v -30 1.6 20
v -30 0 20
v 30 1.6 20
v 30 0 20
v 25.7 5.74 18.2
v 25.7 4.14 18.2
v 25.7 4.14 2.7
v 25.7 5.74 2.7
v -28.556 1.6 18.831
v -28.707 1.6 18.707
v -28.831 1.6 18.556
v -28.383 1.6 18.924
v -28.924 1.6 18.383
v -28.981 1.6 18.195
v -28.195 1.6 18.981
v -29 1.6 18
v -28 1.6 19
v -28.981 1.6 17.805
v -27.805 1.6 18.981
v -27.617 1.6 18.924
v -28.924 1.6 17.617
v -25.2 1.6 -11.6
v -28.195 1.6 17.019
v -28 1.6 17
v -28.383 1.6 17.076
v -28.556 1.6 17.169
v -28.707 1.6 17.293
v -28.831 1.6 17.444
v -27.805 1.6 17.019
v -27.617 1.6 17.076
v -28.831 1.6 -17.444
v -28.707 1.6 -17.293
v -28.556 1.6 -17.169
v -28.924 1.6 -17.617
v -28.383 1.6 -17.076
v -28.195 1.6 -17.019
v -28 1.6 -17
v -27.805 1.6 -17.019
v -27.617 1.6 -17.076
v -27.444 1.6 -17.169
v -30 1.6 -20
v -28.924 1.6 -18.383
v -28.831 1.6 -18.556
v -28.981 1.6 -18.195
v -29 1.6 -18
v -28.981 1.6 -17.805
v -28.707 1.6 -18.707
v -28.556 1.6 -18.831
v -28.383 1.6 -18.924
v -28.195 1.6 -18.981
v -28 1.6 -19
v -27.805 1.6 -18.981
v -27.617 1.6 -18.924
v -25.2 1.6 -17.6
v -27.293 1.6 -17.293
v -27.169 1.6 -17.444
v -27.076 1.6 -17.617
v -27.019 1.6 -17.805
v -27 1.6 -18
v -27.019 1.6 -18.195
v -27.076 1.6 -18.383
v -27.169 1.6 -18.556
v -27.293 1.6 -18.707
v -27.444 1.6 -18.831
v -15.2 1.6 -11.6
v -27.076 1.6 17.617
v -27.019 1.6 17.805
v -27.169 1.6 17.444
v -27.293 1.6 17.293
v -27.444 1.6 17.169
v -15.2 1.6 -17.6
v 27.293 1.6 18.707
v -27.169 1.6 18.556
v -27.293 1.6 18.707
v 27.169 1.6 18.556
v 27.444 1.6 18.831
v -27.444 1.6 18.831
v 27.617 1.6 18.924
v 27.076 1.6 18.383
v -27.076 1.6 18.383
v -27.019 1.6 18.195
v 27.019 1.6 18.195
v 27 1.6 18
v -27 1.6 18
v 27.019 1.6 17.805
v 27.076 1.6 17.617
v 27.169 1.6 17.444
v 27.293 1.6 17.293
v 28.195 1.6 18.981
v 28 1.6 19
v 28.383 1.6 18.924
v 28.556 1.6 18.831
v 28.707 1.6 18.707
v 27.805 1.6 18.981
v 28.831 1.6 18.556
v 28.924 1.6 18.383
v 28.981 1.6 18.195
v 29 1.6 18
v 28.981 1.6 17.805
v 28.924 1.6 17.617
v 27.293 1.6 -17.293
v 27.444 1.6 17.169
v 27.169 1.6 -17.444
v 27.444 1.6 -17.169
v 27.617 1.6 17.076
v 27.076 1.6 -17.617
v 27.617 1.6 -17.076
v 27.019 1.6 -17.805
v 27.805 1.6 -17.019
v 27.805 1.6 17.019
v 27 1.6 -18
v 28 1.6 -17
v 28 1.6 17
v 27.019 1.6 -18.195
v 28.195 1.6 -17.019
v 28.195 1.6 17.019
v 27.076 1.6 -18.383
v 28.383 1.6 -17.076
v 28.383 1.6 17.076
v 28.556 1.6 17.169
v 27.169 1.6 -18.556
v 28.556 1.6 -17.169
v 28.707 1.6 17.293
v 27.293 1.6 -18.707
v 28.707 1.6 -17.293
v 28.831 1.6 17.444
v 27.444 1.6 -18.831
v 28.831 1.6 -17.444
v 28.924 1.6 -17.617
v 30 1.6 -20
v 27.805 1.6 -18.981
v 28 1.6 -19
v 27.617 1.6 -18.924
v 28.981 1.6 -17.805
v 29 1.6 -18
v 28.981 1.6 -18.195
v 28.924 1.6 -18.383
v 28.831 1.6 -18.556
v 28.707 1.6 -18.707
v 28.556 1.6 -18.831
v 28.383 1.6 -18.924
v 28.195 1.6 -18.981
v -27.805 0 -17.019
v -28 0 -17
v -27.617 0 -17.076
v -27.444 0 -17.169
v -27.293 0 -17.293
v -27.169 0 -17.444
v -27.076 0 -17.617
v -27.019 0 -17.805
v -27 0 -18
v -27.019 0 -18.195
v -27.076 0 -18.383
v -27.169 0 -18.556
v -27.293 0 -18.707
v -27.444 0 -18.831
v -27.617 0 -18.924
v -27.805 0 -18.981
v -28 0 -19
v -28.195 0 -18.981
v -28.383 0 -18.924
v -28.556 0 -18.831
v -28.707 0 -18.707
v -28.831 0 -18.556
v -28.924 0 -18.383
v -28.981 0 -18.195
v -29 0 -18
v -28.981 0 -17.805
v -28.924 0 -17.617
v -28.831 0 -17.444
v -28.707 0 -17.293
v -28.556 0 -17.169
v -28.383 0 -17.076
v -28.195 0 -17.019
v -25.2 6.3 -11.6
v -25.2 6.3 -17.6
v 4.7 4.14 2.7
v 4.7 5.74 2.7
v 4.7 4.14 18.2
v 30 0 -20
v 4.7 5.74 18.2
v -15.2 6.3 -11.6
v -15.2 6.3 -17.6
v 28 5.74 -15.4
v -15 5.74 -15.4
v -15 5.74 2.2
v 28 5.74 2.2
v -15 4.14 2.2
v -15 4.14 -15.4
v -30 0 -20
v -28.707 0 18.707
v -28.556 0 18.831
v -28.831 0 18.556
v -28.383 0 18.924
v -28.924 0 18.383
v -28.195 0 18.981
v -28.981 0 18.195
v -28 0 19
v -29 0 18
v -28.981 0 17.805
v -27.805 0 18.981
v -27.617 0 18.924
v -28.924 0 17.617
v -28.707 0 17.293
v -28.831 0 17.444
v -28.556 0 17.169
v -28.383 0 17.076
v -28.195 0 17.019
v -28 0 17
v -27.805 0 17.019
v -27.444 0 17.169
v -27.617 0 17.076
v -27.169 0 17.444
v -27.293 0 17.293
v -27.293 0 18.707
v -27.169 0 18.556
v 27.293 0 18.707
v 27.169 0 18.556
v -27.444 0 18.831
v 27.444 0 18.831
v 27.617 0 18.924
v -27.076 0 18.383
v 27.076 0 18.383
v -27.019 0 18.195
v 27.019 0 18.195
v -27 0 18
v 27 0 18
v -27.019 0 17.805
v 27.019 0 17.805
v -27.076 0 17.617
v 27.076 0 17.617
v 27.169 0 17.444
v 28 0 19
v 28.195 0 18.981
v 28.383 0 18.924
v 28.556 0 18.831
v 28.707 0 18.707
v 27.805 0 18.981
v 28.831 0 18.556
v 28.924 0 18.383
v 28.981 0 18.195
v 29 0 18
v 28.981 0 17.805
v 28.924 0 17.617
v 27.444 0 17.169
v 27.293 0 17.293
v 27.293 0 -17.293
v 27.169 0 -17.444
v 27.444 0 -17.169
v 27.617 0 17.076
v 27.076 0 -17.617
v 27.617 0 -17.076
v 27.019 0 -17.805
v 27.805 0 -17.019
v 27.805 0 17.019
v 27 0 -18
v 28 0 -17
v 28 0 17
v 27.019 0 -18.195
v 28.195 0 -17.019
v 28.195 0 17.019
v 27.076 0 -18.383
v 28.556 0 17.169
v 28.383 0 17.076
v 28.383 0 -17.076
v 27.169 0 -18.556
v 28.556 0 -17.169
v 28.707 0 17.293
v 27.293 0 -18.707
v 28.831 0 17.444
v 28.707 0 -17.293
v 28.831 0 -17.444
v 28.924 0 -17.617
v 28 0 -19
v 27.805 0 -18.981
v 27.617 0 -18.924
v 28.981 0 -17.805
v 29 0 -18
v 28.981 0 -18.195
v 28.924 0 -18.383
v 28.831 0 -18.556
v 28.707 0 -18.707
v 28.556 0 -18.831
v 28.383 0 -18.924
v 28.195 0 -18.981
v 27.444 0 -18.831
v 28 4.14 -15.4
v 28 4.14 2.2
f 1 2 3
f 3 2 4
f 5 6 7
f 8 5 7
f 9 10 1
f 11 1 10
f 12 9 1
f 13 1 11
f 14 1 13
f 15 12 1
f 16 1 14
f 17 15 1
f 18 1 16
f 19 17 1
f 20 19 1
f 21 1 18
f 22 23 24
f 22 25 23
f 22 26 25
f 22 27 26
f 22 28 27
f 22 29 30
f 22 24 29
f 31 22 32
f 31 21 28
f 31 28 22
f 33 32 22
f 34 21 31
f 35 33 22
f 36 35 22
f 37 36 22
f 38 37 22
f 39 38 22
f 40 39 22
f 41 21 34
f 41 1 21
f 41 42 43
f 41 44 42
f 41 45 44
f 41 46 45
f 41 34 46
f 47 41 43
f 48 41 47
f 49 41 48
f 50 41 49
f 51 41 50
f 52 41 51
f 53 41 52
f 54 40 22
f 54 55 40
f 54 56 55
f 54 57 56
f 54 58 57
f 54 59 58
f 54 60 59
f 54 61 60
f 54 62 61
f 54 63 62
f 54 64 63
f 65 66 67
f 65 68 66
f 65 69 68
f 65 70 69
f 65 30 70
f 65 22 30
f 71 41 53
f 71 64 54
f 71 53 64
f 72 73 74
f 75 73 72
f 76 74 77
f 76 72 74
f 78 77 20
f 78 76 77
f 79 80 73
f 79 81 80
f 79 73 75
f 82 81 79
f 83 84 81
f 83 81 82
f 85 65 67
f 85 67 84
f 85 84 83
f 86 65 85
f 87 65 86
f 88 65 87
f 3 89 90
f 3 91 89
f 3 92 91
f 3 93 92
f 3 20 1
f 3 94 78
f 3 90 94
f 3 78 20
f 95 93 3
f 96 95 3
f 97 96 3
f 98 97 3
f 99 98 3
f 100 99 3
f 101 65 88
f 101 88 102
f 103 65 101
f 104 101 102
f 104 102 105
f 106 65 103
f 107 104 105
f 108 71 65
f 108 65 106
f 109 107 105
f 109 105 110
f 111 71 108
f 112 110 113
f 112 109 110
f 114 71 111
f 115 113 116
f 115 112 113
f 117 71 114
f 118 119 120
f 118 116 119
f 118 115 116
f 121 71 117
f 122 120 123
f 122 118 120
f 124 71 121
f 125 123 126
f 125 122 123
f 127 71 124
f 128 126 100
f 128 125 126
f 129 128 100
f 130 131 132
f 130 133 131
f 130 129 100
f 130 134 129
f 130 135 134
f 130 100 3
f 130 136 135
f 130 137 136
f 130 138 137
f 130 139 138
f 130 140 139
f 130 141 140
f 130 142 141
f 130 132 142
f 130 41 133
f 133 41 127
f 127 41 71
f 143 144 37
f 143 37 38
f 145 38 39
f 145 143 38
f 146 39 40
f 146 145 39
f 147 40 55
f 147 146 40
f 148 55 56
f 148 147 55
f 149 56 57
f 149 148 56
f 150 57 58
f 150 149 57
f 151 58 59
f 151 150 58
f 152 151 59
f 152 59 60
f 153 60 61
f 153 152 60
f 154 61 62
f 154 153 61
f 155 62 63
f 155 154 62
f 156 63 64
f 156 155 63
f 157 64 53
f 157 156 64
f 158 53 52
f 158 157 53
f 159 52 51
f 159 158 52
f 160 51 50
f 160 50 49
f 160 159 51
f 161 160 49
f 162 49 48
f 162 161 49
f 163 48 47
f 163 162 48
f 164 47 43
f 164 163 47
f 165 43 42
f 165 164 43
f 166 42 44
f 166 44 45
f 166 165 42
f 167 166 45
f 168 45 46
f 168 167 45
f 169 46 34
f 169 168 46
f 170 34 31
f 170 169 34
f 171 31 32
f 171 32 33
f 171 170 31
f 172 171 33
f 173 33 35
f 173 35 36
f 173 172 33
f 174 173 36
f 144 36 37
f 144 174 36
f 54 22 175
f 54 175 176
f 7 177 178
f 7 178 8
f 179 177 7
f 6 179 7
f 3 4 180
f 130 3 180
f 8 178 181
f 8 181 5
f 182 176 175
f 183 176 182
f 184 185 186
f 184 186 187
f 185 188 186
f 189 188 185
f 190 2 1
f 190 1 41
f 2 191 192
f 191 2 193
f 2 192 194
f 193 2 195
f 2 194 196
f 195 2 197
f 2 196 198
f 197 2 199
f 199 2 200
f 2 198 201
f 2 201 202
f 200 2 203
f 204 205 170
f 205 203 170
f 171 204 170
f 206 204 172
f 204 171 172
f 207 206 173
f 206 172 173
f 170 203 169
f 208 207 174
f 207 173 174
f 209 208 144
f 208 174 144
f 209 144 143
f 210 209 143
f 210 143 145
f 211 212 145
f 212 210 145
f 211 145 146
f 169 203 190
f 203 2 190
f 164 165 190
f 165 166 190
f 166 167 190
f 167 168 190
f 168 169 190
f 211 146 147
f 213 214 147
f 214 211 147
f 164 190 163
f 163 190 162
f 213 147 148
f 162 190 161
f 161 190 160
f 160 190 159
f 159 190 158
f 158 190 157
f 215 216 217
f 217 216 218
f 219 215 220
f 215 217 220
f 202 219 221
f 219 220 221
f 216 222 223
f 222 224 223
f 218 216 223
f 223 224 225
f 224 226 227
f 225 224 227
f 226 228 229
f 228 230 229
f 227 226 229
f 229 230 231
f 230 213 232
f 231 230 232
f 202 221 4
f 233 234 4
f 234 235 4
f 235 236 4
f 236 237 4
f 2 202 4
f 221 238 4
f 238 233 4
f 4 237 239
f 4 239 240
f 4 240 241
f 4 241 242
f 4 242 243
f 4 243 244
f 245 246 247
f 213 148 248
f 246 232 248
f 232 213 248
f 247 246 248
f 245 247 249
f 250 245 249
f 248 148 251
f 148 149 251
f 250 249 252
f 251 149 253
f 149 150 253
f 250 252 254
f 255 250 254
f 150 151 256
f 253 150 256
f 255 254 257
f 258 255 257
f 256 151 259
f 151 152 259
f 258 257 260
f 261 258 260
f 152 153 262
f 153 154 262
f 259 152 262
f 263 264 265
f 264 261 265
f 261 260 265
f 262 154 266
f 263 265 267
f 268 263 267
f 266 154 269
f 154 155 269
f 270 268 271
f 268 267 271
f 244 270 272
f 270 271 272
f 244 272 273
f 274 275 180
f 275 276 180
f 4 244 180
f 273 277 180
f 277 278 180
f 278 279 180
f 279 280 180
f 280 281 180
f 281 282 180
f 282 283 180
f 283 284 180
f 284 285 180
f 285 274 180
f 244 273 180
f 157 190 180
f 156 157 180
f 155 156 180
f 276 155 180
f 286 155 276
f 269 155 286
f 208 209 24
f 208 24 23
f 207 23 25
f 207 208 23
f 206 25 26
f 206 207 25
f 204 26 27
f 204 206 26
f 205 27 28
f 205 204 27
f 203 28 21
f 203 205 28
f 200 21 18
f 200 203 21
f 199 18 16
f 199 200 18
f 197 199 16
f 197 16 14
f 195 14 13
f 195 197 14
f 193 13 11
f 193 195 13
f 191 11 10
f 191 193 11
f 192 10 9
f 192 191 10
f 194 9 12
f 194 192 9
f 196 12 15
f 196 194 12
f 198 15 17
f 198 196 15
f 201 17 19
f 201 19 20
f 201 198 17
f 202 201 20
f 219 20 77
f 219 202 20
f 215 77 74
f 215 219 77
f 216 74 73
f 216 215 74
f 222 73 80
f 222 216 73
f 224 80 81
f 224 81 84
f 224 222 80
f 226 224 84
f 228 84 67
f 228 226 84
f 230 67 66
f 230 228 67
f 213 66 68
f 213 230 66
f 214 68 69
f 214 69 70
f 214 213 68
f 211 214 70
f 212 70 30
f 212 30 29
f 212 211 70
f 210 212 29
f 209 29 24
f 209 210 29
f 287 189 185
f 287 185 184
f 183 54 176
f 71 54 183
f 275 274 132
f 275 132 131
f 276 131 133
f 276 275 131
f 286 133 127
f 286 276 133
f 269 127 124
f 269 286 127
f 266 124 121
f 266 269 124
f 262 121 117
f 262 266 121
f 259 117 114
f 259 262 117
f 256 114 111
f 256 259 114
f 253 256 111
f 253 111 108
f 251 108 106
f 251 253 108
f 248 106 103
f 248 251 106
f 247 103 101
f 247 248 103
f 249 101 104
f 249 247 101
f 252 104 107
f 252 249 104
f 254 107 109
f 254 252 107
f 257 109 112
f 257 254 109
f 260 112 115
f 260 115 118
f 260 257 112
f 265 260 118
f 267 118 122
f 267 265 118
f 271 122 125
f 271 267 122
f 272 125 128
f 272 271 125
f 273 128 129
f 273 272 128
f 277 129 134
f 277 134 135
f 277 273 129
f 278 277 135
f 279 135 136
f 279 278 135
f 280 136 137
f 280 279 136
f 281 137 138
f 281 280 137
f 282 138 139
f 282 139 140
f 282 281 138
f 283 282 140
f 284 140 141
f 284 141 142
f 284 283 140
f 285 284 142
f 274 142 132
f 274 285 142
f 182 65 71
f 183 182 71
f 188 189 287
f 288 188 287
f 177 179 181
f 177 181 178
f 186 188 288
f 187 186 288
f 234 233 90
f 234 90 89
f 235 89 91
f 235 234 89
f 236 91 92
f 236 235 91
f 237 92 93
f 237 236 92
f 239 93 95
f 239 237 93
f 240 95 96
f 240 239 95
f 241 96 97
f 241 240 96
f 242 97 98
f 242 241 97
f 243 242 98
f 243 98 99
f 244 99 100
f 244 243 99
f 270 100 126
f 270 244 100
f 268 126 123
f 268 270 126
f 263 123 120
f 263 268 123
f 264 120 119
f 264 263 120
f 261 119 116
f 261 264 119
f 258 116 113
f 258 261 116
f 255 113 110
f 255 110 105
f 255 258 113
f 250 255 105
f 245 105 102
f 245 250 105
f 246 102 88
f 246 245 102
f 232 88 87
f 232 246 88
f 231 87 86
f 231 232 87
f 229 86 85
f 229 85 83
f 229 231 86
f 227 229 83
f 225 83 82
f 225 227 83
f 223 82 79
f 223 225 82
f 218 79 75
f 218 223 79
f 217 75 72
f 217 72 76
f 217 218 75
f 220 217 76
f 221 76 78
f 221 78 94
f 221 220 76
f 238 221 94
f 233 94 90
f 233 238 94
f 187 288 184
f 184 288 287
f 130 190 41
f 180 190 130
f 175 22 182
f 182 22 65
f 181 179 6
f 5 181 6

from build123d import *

# Parameters (mm, degrees)
SKETCH1_W             = 60
SKETCH1_H             = 40
SKETCH1_R             = 1
BOSS_EXTRUDE1_DEPTH   = 1.6
SKETCH3_W             = 43
SKETCH3_H             = 17.6
BOSS_EXTRUDE2_DEPTH   = 1.6
SKETCH3_W_2           = 21
SKETCH3_H_2           = 15.5
BOSS_EXTRUDE2_2_DEPTH = 1.6
SKETCH4_W             = 10
SKETCH4_H             = 6
BOSS_EXTRUDE3_DEPTH   = 4.7


with BuildPart() as part:
    # Sketch1 → Boss-Extrude1 (new body)
    with BuildSketch(Plane(origin=(0, 0, 0), x_dir=(1, 0, 0), z_dir=(0, 1, 0))):
        Rectangle(SKETCH1_W, SKETCH1_H)
        with Locations(Location((-28, 18, 0), (0, 0, 270))):
            Circle(SKETCH1_R, mode=Mode.SUBTRACT)
        with Locations(Location((28, 18, 0), (0, 0, 90))):
            Circle(SKETCH1_R, mode=Mode.SUBTRACT)
        with Locations(Location((28, -18, 0), (0, 0, 270))):
            Circle(SKETCH1_R, mode=Mode.SUBTRACT)
        with Locations(Location((-28, -18, 0), (0, 0, 90))):
            Circle(SKETCH1_R, mode=Mode.SUBTRACT)
    extrude(amount=BOSS_EXTRUDE1_DEPTH)

    # Sketch4 → Boss-Extrude3 (add)
    with BuildSketch(Plane(origin=(0, 1.6, 0), x_dir=(1, 0, 0), z_dir=(0, 1, 0))):
        with Locations((-20.2, 14.6)):
            Rectangle(SKETCH4_W, SKETCH4_H)
    extrude(amount=BOSS_EXTRUDE3_DEPTH)


with BuildPart() as body_2:
    # Sketch3 → Boss-Extrude2 (new body)
    with BuildSketch(Plane(origin=(0, 4.14, 0), x_dir=(1, 0, 0), z_dir=(0, 1, 0))):
        with Locations((6.5, 6.6)):
            Rectangle(SKETCH3_W, SKETCH3_H)
    extrude(amount=BOSS_EXTRUDE2_DEPTH)


with BuildPart() as body_3:
    # Sketch3 → Boss-Extrude2 2 (new body)
    with BuildSketch(Plane(origin=(0, 4.14, 0), x_dir=(1, 0, 0), z_dir=(0, 1, 0))):
        with Locations((15.2, -10.45)):
            Rectangle(SKETCH3_W_2, SKETCH3_H_2)
    extrude(amount=BOSS_EXTRUDE2_2_DEPTH)


solid = Compound([part.part, body_2.part, body_3.part])
